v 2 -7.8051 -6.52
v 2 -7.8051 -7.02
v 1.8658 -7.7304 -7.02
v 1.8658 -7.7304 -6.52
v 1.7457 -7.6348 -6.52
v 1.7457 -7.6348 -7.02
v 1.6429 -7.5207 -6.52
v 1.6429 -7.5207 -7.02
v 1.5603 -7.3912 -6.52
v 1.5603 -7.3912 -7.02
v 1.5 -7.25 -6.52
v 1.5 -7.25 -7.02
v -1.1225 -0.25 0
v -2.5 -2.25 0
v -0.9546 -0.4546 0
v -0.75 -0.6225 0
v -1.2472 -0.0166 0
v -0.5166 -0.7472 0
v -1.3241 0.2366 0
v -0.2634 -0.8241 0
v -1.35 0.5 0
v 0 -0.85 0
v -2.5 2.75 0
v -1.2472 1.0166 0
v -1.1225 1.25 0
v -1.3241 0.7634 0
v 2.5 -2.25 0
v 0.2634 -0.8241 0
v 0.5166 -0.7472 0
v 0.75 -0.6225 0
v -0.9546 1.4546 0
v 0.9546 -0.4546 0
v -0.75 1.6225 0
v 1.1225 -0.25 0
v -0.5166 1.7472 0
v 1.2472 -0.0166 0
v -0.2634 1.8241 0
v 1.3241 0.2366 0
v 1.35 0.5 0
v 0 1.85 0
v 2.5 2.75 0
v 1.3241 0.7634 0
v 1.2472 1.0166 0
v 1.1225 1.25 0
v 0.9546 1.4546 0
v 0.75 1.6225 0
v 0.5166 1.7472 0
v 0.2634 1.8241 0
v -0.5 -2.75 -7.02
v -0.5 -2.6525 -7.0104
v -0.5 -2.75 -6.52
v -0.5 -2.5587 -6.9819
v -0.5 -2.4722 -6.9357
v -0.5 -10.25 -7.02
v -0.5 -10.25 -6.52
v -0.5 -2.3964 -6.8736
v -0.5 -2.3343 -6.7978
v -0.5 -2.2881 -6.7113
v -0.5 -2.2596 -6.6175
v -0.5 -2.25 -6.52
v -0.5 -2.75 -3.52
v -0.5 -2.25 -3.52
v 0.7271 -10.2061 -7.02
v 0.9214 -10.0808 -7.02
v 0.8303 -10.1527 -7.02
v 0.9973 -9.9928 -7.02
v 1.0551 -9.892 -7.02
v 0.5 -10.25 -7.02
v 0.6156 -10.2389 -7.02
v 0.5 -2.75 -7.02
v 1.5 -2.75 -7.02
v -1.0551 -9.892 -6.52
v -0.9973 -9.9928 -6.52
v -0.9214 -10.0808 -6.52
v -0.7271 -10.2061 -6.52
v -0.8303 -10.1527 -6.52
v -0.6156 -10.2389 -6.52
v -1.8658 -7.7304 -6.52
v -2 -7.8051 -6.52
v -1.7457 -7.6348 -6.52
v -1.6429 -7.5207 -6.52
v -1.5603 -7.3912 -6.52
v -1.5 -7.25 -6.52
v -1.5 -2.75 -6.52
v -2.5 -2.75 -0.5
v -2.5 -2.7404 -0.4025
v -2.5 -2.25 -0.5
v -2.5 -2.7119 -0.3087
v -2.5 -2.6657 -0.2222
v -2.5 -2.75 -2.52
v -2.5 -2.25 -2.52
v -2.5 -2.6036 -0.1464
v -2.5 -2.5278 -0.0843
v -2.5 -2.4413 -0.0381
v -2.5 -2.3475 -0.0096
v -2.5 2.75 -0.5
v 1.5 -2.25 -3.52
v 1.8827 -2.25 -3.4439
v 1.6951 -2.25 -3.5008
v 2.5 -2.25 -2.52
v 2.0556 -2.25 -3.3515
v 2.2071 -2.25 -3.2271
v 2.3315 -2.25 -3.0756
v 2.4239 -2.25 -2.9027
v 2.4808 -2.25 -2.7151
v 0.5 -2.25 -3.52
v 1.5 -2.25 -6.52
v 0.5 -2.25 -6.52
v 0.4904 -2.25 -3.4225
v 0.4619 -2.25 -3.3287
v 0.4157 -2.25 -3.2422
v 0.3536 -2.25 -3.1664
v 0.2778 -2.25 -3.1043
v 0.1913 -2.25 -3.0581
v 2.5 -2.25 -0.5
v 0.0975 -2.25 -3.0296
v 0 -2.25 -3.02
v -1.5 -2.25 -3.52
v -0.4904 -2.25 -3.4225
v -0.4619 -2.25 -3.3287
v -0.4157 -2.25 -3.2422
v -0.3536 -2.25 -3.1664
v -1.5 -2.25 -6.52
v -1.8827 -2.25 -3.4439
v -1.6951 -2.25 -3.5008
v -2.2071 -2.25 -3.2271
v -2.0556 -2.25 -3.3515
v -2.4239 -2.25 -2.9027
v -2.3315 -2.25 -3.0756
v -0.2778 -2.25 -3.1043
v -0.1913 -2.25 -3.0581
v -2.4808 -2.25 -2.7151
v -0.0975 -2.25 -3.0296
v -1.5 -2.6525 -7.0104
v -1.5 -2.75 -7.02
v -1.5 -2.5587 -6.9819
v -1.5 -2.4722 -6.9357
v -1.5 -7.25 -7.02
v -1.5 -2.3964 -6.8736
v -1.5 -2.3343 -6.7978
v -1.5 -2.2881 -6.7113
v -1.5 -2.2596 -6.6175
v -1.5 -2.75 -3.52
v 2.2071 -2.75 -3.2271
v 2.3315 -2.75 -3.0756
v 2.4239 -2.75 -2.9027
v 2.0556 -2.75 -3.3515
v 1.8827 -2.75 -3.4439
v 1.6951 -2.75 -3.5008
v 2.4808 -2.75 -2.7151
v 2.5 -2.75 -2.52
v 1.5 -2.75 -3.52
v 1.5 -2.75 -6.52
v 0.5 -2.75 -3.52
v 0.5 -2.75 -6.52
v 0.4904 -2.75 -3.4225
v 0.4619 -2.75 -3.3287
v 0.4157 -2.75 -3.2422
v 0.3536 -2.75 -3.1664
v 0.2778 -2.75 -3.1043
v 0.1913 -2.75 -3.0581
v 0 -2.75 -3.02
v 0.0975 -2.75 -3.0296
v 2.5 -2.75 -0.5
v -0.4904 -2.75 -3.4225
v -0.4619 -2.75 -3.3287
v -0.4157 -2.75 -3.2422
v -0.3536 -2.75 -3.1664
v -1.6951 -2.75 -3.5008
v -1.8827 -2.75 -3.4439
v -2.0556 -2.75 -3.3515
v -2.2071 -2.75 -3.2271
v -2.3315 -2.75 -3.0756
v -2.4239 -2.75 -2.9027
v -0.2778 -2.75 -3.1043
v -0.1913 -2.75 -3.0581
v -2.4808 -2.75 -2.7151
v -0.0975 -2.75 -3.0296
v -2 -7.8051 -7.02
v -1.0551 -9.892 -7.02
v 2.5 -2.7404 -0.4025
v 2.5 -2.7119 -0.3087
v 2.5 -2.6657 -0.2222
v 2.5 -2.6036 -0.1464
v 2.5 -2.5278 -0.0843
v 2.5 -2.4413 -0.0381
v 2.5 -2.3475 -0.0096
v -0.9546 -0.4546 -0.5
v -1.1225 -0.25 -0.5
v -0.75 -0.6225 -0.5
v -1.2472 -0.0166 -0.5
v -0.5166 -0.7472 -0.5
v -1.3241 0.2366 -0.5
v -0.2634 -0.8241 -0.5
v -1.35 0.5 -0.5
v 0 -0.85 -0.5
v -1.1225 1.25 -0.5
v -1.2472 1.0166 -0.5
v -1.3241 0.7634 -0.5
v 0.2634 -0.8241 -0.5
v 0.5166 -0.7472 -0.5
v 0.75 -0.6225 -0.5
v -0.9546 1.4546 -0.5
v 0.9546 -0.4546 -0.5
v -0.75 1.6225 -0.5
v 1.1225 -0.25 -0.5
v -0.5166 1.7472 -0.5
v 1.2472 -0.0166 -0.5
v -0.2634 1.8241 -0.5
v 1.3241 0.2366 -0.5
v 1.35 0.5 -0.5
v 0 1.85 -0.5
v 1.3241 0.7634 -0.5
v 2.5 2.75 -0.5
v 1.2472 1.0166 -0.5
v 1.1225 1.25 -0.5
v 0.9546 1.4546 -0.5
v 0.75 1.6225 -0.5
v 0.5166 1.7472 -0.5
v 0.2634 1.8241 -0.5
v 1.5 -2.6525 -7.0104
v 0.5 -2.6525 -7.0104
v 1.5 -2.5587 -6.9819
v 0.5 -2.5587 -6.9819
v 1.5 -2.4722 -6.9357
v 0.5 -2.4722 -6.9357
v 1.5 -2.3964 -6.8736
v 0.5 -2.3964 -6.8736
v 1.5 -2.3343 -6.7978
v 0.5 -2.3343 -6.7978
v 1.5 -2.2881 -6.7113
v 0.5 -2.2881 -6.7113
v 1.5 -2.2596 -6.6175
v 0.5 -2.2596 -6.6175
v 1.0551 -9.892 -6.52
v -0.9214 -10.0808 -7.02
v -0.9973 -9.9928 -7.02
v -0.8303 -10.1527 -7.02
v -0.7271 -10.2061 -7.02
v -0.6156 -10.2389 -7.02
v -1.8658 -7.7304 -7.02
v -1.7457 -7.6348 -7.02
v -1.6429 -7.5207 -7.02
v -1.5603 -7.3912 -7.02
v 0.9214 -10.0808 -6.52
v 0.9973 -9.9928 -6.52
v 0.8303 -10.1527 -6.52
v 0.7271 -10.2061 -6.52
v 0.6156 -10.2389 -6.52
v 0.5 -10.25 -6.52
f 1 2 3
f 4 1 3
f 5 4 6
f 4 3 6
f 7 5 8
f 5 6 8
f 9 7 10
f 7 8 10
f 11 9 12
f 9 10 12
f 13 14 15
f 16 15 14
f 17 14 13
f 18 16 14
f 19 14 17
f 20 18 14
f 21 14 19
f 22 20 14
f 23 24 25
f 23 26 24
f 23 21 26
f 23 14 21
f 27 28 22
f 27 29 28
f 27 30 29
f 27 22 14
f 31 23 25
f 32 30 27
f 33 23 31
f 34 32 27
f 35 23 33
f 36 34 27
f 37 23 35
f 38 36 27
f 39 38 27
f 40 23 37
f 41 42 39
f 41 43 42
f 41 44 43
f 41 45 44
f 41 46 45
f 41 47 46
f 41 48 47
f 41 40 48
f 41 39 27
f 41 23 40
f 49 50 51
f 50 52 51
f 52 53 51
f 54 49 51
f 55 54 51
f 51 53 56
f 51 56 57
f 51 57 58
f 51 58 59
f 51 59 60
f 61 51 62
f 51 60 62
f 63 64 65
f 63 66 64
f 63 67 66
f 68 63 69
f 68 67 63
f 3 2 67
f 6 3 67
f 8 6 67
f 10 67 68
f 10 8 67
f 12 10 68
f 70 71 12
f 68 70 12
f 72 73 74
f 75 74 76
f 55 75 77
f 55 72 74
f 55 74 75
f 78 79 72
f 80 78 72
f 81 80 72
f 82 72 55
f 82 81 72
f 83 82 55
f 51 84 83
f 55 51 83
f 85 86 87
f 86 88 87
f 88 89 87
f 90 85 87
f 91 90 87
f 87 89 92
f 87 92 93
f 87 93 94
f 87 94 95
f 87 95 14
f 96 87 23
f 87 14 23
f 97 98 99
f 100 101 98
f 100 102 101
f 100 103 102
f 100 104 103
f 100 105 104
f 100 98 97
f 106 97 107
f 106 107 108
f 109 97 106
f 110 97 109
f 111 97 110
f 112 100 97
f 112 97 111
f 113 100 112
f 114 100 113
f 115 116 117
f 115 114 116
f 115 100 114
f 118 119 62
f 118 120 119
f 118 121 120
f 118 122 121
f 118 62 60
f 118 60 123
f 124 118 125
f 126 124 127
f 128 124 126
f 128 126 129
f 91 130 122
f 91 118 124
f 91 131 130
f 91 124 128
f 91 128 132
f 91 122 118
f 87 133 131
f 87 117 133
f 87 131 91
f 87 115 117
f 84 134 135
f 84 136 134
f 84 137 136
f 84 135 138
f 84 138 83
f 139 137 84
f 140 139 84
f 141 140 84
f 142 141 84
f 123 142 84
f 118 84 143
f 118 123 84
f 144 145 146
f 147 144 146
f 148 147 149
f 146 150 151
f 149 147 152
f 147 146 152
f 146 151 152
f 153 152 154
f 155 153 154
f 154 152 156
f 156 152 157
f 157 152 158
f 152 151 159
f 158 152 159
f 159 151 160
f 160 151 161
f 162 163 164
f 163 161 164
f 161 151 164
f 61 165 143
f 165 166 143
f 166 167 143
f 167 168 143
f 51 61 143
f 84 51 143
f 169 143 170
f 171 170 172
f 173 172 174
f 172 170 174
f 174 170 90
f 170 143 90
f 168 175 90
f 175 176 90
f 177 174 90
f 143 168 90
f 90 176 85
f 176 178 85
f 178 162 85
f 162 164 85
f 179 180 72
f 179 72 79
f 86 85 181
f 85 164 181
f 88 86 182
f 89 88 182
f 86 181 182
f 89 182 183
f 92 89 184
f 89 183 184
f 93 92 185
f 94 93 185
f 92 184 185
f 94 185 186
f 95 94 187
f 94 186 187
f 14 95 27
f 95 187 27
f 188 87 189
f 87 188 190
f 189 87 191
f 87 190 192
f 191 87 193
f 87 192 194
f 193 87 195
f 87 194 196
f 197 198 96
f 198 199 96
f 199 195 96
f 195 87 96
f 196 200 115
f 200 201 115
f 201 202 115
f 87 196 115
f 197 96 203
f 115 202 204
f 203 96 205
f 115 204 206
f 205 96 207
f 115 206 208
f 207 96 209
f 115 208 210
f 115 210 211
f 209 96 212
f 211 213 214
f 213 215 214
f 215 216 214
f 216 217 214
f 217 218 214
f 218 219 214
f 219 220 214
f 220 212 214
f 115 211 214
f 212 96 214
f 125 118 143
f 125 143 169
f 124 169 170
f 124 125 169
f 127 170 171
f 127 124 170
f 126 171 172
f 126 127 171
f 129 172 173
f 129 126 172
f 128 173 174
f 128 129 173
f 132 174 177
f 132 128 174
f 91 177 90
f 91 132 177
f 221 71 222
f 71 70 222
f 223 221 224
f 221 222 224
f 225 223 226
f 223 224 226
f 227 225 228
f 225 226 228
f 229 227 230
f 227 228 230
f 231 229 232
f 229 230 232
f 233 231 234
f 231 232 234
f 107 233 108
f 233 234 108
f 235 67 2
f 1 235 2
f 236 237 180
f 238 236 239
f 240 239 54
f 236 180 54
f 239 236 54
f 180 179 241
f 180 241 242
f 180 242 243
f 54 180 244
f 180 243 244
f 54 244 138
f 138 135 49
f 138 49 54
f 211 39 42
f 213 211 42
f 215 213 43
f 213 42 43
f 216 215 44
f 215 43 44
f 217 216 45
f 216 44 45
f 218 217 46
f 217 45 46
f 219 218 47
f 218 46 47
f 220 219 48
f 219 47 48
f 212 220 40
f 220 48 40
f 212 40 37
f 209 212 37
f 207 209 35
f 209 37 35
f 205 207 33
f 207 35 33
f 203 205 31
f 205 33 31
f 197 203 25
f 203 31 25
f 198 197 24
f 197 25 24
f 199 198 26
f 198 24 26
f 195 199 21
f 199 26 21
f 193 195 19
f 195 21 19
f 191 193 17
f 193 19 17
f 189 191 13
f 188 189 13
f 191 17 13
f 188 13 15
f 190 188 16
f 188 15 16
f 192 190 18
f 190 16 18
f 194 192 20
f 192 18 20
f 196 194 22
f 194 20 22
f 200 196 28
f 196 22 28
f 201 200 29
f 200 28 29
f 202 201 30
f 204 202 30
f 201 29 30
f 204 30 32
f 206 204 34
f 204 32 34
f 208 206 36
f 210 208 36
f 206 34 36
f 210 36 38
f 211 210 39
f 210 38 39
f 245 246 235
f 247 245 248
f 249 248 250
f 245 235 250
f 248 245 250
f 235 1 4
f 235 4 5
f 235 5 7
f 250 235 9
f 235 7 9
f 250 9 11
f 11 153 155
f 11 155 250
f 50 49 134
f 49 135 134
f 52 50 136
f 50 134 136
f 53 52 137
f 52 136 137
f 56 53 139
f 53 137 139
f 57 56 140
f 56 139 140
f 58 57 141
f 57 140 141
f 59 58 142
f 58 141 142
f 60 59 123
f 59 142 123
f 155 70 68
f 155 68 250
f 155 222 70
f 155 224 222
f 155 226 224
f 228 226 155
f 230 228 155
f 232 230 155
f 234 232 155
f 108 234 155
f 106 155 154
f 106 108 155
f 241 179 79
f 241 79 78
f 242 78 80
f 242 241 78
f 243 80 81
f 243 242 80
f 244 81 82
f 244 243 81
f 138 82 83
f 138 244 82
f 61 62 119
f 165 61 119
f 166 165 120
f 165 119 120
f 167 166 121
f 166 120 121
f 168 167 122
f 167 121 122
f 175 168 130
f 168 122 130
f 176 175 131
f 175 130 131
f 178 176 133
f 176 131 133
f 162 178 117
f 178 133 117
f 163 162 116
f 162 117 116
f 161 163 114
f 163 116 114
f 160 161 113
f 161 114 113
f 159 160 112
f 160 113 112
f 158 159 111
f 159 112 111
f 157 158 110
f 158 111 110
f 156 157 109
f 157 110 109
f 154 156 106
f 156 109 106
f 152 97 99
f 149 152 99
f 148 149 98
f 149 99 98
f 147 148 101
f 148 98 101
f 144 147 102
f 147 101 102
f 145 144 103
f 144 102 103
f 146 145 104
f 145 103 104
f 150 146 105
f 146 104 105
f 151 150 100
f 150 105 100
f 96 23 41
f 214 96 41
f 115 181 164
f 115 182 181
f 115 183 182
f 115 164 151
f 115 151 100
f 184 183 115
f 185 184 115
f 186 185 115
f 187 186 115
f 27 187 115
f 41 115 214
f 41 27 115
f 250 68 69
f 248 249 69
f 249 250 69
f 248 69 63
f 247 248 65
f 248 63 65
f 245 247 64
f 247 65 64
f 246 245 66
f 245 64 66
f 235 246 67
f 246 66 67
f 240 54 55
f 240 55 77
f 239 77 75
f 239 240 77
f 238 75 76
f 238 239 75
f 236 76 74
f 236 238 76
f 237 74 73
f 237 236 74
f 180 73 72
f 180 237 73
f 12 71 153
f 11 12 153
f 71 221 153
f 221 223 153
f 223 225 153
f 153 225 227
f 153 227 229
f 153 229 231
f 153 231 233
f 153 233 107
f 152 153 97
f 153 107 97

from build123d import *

# Parameters (mm, degrees)
ESBO_O1_W                = 5
ESBO_O1_H                = 5.5
ESBO_O1_R                = 1.35
RESSALTO_EXTRUS_O1_DEPTH = 0.5
ESBO_O2_W                = 5
ESBO_O2_H                = 0.5
RESSALTO_EXTRUS_O2_DEPTH = 6.52
FILETE3_R                = 0.5
CORTE_EXTRUS_O1_DEPTH    = 9.973873188
CORTE_EXTRUS_O2_DEPTH    = 9.973873188
ESBO_O5_W                = 1
ESBO_O5_H                = 0.5
RESSALTO_EXTRUS_O3_DEPTH = 7.5
FILETE4_R                = 0.5
ESBO_O6_W                = 1.52
ESBO_O6_H                = 3
RESSALTO_EXTRUS_O4_DEPTH = 0.5
CORTE_EXTRUS_O3_DEPTH    = 13.672525399
FILETE4_OF_ESPELHAR2_R   = 0.5


with BuildPart() as part:
    # Esboço1 → Ressalto-extrusão1 (new body)
    with BuildSketch(Plane.XY):
        Rectangle(ESBO_O1_W, ESBO_O1_H)
        with Locations((0, 0.5)):
            Circle(ESBO_O1_R, mode=Mode.SUBTRACT)
    extrude(amount=-RESSALTO_EXTRUS_O1_DEPTH)

    # Esboço2 → Ressalto-extrusão2 (add)
    with BuildSketch(Plane(origin=(0, 0, -0.5), x_dir=(-1, 0, 0), z_dir=(0, 0, -1))):
        with Locations((0, -2.5)):
            Rectangle(ESBO_O2_W, ESBO_O2_H)
    extrude(amount=RESSALTO_EXTRUS_O2_DEPTH)

    # Filete3
    filete3_edges = [part.edges().sort_by_distance(p)[0] for p in [
        (0, -2.75, 0),
    ]]
    fillet(filete3_edges, radius=FILETE3_R)

    # Esboço3 → Corte-extrusão1 (cut, through all)
    with BuildSketch(Plane(origin=(0, -2.25, 0), x_dir=(1, 0, 0), z_dir=(0, 1, 0))):
        with BuildLine():
            Line((-0.5, 7.02), (-0.5, 3.52))
            ThreePointArc((-0.5, 3.52), (0, 3.02), (0.5, 3.52))
            Line((0.5, 3.52), (0.5, 7.02))
            Line((0.5, 7.02), (-0.5, 7.02))
        make_face()
    extrude(amount=-CORTE_EXTRUS_O1_DEPTH, mode=Mode.SUBTRACT)

    # Esboço4 → Corte-extrusão2 (cut, through all)
    with BuildSketch(Plane(origin=(0, -2.25, 0), x_dir=(1, 0, 0), z_dir=(0, 1, 0))):
        with BuildLine():
            Line((1.5, 7.02), (1.5, 3.52))
            ThreePointArc((1.5, 3.52), (2.207106781, 3.227106781), (2.5, 2.52))
            Line((2.5, 2.52), (2.5, 7.02))
            Line((2.5, 7.02), (1.5, 7.02))
        make_face()
    corte_extrus_o2 = extrude(amount=-CORTE_EXTRUS_O2_DEPTH, mode=Mode.SUBTRACT)

    # Espelhar1: Corte-extrusão2 across plane
    add(corte_extrus_o2.mirror(Plane(origin=(0, 0, 0), x_dir=(0, 0, 1), z_dir=(1, 0, 0))), mode=Mode.SUBTRACT)

    # Esboço5 → Ressalto-extrusão3 (add)
    with BuildSketch(Plane.XZ.offset(2.75)):
        with Locations((-1, -6.77)):
            Rectangle(ESBO_O5_W, ESBO_O5_H)
    ressalto_extrus_o3 = extrude(amount=RESSALTO_EXTRUS_O3_DEPTH)

    # Filete4
    filete4_edges = [part.edges().sort_by_distance(p)[0] for p in [
        (-1, -2.25, -7.02),
    ]]
    fillet(filete4_edges, radius=FILETE4_R)

    # Esboço6 → Ressalto-extrusão4 (add)
    with BuildSketch(Plane(origin=(0, 0, -7.02), x_dir=(-1, 0, 0), z_dir=(0, 0, -1))):
        with Locations((1.26, -8.75)):
            Rectangle(ESBO_O6_W, ESBO_O6_H)
    ressalto_extrus_o4 = extrude(amount=-RESSALTO_EXTRUS_O4_DEPTH)

    # Esboço7 → Corte-extrusão3 (cut, through all)
    with BuildSketch(Plane(origin=(0, 0, -7.02), x_dir=(-1, 0, 0), z_dir=(0, 0, -1))):
        with BuildLine():
            Line((1.5, -7.25), (2.02, -7.25))
            Line((2.02, -7.25), (2.02, -10.25))
            Line((2.02, -10.25), (0.5, -10.25))
            ThreePointArc((0.5, -10.25), (0.830266035, -10.152734868), (1.055096438, -9.891990837))
            Line((1.055096438, -9.891990837), (2, -7.805096438))
            ThreePointArc((2, -7.805096438), (1.691943399, -7.579842376), (1.5, -7.25))
        make_face()
    corte_extrus_o3 = extrude(amount=-CORTE_EXTRUS_O3_DEPTH, mode=Mode.SUBTRACT)

    # Espelhar2: Ressalto-extrusão3, Ressalto-extrusão4, Corte-extrusão3 across plane
    add(ressalto_extrus_o3.mirror(Plane(origin=(0, 0, 0), x_dir=(0, 0, 1), z_dir=(1, 0, 0))))
    add(ressalto_extrus_o4.mirror(Plane(origin=(0, 0, 0), x_dir=(0, 0, 1), z_dir=(1, 0, 0))))
    add(corte_extrus_o3.mirror(Plane(origin=(0, 0, 0), x_dir=(0, 0, 1), z_dir=(1, 0, 0))), mode=Mode.SUBTRACT)

    # Filete4 of Espelhar2
    filete4_of_espelhar2_edges = [part.edges().sort_by_distance(p)[0] for p in [
        (1, -2.25, -7.02),
    ]]
    fillet(filete4_of_espelhar2_edges, radius=FILETE4_OF_ESPELHAR2_R)


solid = part.part
